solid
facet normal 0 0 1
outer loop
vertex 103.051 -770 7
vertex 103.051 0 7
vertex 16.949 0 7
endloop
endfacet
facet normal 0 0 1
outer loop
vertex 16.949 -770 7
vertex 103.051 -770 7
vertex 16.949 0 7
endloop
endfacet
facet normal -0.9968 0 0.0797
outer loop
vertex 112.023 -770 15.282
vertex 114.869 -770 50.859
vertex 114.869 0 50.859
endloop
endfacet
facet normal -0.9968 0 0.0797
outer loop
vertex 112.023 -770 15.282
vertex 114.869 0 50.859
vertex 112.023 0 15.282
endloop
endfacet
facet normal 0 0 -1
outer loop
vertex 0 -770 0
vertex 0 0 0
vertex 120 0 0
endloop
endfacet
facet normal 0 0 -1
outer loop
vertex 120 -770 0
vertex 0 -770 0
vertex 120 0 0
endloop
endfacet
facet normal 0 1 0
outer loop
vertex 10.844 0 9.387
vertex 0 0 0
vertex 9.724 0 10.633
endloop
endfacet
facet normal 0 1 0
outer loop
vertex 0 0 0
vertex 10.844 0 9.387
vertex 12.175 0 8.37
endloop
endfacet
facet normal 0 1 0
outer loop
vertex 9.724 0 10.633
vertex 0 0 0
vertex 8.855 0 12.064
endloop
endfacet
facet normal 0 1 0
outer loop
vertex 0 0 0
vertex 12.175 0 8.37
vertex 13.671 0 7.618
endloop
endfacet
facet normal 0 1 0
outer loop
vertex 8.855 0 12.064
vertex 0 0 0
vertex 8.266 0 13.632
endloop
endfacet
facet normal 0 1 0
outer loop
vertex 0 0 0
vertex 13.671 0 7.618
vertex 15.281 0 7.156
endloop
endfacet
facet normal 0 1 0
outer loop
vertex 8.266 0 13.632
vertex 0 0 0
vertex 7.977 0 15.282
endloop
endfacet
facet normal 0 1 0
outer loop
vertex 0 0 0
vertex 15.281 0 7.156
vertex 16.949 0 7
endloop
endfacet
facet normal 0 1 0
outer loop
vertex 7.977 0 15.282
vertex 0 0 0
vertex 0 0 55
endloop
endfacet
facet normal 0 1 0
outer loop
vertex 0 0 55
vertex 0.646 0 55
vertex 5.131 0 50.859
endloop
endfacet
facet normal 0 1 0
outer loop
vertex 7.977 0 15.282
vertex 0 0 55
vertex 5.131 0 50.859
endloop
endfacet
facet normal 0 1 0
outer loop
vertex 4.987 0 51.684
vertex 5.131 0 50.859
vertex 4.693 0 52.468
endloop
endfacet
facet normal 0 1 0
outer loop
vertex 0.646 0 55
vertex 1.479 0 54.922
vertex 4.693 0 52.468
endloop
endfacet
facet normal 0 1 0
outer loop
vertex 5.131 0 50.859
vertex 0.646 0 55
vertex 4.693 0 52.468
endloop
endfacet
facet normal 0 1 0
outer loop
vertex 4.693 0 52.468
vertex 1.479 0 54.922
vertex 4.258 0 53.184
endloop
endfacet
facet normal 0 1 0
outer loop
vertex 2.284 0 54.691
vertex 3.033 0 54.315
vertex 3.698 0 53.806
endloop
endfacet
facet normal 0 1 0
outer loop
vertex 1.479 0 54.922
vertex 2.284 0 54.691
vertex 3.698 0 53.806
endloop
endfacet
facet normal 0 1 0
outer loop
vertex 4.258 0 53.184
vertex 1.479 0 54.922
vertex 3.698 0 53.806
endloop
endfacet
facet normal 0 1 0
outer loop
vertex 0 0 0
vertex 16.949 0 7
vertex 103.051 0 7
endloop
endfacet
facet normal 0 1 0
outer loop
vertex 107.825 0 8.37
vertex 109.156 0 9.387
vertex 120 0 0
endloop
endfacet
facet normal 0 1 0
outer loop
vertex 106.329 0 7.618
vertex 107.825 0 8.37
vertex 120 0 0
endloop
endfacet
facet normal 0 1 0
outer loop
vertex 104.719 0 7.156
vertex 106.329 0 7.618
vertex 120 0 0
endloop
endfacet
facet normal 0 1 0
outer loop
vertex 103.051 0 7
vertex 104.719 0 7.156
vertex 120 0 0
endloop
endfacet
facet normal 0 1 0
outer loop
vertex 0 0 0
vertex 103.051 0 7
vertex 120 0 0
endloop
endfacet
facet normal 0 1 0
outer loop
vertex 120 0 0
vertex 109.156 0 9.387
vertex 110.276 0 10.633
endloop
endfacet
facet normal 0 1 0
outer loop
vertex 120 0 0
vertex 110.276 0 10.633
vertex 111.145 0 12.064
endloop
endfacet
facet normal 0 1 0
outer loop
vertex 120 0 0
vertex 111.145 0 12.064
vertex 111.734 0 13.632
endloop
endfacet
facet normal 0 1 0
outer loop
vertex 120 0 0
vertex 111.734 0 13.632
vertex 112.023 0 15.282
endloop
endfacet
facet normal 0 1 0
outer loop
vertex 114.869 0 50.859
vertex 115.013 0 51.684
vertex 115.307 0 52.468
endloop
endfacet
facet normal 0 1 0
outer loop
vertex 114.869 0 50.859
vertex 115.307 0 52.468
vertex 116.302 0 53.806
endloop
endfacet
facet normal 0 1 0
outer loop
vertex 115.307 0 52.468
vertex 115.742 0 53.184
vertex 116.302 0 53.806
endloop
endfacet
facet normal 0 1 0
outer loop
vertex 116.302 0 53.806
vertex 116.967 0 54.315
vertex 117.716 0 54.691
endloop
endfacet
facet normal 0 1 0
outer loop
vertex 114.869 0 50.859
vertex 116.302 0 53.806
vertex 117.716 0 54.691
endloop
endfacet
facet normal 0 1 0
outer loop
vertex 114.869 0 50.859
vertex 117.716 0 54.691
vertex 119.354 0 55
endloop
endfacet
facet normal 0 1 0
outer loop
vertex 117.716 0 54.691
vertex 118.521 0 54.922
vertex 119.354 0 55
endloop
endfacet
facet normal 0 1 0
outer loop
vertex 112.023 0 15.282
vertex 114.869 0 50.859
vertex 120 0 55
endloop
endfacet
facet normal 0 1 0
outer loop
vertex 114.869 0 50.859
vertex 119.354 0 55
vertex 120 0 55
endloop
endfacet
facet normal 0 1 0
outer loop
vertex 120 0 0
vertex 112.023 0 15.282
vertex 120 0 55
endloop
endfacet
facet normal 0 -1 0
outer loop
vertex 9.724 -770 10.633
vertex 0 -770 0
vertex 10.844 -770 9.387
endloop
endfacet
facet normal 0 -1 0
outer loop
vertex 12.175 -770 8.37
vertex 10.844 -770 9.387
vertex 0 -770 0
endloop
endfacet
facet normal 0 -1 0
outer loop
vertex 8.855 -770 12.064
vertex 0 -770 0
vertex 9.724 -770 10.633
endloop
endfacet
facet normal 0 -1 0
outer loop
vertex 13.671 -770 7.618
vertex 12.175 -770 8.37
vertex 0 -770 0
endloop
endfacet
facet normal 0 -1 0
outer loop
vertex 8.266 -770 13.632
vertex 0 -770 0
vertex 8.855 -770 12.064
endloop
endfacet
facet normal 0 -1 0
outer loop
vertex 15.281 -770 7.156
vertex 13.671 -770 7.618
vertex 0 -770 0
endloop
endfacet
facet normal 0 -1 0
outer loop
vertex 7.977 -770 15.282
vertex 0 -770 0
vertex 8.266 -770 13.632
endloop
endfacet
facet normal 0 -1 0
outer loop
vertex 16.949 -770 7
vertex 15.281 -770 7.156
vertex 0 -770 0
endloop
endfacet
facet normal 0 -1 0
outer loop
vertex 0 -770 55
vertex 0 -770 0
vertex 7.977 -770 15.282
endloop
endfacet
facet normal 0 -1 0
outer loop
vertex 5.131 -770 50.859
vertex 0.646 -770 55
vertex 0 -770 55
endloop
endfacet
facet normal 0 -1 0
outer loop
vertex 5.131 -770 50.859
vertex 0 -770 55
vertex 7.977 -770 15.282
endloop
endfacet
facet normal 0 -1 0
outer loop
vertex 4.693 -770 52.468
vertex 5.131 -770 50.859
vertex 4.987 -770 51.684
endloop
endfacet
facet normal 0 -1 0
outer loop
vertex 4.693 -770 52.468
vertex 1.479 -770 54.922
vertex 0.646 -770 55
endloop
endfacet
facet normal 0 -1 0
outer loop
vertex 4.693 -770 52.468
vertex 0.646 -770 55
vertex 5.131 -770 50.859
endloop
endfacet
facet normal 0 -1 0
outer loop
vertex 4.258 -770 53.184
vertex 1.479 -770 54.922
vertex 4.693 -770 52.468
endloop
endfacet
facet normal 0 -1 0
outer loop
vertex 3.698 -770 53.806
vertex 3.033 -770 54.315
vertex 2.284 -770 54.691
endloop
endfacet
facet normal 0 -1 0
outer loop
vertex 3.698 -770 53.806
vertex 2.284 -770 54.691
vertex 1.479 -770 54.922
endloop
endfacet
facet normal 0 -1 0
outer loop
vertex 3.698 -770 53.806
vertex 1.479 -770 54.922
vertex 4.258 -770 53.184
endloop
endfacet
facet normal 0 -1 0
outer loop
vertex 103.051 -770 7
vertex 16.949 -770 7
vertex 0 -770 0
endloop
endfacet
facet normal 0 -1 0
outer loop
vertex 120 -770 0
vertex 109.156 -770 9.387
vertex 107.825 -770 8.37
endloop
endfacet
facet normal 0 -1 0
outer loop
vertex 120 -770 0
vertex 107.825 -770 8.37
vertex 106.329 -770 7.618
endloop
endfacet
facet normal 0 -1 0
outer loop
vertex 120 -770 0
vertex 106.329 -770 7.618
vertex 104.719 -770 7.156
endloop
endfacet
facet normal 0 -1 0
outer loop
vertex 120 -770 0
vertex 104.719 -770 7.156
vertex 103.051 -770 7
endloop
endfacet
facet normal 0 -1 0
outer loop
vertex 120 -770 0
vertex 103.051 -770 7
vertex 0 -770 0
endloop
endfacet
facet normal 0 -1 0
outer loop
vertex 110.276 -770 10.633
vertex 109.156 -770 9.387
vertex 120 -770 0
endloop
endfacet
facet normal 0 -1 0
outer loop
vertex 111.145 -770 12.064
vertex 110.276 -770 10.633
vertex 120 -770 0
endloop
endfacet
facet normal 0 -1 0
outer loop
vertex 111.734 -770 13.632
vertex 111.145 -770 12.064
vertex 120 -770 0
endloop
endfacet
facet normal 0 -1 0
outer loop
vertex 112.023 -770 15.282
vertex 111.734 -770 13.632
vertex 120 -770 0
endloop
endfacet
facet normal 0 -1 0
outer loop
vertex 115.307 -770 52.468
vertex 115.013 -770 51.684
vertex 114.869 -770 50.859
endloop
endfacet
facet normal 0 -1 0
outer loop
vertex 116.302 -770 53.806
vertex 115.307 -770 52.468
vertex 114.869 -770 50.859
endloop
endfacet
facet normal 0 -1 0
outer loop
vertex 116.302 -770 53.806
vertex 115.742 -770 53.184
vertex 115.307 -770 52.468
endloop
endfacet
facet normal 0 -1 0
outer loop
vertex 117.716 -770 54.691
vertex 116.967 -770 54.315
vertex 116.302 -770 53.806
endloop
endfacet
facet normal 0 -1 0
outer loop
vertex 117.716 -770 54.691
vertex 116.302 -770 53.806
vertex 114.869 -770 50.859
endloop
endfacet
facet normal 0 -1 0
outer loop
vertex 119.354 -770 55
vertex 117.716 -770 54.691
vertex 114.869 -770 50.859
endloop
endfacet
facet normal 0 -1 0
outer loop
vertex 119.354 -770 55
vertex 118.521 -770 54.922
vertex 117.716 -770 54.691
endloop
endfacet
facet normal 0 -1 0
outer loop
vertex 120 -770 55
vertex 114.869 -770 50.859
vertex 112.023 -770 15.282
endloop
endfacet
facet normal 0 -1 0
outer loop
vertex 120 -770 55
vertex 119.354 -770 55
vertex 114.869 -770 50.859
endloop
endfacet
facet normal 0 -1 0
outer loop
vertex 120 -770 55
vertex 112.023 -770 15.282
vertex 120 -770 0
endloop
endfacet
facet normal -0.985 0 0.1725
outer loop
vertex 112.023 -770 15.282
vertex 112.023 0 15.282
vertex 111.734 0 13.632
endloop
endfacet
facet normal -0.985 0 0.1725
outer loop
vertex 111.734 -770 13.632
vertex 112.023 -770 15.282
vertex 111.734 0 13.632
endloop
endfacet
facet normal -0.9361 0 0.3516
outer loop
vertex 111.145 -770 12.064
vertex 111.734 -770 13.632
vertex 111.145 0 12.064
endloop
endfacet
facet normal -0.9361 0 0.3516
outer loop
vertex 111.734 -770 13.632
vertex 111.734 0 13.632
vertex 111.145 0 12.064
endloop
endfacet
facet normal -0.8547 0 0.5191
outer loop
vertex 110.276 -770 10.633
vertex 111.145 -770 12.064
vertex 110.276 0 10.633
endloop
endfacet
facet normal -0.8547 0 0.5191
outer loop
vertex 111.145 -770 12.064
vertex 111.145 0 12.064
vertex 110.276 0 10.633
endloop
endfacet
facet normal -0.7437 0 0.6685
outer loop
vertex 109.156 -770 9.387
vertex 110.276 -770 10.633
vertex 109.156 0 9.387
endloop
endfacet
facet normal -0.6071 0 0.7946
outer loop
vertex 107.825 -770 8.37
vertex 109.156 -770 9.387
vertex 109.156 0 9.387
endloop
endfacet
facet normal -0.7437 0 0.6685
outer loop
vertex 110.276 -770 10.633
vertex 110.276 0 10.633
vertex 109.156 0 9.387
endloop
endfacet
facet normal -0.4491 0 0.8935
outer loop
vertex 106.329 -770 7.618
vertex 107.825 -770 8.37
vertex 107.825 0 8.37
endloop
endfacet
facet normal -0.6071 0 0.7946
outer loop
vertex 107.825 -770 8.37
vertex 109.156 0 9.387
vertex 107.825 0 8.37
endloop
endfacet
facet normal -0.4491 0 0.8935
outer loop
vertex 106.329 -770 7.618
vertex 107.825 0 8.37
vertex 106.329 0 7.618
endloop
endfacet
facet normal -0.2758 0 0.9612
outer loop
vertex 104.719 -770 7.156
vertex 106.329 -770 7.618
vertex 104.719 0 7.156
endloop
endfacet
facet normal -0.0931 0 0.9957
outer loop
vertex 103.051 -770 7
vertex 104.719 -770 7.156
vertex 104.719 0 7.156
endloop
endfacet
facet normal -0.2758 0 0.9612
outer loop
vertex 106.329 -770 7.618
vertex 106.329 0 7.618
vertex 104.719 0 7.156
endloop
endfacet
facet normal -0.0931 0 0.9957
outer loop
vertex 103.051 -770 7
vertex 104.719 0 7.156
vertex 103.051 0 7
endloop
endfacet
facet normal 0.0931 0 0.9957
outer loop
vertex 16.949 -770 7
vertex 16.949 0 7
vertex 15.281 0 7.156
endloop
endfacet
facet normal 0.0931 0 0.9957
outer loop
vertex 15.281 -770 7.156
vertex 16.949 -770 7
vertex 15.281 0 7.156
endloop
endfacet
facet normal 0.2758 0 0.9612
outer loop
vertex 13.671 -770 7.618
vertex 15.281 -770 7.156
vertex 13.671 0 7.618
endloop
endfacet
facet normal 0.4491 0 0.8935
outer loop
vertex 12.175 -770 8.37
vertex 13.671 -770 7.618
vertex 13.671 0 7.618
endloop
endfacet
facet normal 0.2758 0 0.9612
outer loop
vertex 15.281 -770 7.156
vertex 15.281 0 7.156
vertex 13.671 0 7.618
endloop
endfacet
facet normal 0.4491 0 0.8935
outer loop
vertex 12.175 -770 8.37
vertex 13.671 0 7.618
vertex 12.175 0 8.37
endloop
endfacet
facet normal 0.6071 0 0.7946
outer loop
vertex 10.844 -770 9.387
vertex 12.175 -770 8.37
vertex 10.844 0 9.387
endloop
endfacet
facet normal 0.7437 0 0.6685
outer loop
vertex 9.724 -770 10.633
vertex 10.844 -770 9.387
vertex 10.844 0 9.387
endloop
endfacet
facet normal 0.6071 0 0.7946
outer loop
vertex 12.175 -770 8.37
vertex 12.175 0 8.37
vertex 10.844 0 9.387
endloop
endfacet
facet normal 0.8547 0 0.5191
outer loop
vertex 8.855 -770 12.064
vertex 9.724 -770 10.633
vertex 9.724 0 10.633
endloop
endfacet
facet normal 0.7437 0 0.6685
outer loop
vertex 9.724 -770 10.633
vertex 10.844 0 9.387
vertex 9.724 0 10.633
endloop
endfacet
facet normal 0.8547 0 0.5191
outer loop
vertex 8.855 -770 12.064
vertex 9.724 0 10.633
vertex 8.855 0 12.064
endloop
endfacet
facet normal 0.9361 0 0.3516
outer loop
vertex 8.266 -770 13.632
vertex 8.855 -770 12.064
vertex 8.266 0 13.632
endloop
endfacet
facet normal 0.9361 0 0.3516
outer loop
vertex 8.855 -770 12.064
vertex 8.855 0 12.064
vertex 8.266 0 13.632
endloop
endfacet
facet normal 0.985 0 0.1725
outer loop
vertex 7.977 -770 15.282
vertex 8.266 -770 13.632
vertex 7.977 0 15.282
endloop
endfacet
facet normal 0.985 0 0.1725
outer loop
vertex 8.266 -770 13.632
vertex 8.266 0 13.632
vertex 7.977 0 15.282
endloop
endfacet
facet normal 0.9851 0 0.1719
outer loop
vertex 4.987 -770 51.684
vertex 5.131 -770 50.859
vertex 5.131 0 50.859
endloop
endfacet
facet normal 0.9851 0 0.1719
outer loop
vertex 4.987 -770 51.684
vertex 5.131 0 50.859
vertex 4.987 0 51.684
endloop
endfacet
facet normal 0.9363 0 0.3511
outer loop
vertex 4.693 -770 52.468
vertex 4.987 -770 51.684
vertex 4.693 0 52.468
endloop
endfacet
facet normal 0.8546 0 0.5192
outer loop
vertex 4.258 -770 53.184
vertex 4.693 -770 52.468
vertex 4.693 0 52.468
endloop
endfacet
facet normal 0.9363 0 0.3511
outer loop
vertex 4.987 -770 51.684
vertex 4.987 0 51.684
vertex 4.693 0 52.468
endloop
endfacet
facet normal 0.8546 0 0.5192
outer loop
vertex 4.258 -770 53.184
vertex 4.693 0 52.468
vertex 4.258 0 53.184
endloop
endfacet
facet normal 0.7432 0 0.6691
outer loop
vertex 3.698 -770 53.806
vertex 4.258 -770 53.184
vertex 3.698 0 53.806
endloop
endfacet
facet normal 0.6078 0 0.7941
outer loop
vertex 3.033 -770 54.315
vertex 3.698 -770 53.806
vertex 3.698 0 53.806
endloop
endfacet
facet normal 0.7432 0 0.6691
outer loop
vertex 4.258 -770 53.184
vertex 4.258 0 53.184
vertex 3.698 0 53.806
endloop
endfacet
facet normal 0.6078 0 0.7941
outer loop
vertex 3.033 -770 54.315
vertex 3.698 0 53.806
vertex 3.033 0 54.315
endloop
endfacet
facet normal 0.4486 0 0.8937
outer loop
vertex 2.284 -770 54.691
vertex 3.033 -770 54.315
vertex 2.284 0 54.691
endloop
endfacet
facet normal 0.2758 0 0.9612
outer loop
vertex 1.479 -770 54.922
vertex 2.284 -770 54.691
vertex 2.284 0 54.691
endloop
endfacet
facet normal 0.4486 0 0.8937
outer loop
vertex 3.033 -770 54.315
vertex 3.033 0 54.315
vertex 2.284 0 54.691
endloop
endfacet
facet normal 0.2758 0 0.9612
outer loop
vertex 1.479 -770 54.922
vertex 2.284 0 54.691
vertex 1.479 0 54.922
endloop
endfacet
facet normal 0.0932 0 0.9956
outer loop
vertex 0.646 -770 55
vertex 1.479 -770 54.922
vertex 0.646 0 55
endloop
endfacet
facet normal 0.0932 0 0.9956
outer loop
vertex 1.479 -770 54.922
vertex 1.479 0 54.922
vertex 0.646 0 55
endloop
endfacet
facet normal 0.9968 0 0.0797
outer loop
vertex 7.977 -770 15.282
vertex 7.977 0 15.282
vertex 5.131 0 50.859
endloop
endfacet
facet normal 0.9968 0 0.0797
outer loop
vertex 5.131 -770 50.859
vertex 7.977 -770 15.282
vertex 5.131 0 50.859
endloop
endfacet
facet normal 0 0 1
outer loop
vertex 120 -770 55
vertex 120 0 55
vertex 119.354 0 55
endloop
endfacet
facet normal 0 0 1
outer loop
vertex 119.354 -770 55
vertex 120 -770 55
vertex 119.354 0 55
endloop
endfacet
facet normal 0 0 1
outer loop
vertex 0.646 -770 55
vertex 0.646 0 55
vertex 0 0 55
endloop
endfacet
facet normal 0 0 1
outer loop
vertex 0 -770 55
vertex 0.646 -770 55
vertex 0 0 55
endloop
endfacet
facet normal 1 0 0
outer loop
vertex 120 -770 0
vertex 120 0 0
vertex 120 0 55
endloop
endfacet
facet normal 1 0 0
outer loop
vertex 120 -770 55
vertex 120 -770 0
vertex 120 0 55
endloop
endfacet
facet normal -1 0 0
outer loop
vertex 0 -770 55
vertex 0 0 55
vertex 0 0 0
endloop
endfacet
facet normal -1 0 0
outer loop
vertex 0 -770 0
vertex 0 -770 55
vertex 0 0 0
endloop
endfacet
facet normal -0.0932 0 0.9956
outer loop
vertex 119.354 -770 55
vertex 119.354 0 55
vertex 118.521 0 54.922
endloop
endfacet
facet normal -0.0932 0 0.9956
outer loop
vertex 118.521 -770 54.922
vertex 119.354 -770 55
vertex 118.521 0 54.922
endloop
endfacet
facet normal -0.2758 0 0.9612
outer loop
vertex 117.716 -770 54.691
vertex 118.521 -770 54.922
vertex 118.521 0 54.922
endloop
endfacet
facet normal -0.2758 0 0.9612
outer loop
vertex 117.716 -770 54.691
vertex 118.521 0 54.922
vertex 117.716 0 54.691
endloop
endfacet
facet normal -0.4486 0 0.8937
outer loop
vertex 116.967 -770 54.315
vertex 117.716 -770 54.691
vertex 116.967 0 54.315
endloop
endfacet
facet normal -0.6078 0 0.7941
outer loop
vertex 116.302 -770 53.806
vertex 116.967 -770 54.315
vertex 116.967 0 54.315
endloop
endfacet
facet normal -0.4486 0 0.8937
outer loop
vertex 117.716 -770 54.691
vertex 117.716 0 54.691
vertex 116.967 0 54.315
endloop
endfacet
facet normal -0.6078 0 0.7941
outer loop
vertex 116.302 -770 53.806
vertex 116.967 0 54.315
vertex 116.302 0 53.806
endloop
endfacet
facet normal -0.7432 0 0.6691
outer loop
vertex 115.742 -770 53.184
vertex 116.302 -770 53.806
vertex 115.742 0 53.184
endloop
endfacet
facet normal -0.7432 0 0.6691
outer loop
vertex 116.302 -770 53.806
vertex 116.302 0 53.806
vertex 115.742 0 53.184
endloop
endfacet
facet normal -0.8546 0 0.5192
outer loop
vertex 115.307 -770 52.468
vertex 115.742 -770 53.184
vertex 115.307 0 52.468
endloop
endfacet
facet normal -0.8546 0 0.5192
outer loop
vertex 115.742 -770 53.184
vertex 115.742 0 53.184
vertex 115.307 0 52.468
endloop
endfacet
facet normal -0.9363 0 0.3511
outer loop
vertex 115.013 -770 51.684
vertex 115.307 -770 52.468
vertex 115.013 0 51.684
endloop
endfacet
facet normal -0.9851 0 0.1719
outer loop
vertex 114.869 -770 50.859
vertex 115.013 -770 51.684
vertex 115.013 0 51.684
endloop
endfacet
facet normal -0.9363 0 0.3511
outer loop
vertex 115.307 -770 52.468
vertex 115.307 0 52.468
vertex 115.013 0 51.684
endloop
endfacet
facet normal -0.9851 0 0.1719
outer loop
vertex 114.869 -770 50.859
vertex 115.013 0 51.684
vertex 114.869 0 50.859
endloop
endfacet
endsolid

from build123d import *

# Parameters (mm, degrees)
F1_DEPTH = 770


with BuildPart() as f1:
    # F0 (on Front) → F1 (new body)
    with BuildSketch(Plane.XZ):
        with BuildLine():
            Line((0.645623, 55), (0, 55))
            Line((0, 55), (0, 0))
            Line((0, 0), (120, 0))
            Line((120, 0), (120, 55))
            Line((120, 55), (119.354377, 55))
            ThreePointArc((119.354377, 55), (116.301906, 53.806421), (114.868708, 50.858854))
            Line((114.868708, 50.858854), (112.022583, 15.282293))
            ThreePointArc((112.022583, 15.282293), (109.156188, 9.387158), (103.051246, 7))
            Line((103.051246, 7), (16.948754, 7))
            ThreePointArc((16.948754, 7), (10.843812, 9.387158), (7.977417, 15.282293))
            Line((7.977417, 15.282293), (5.131292, 50.858854))
            ThreePointArc((5.131292, 50.858854), (3.698094, 53.806421), (0.645623, 55))
        make_face()
    extrude(amount=F1_DEPTH)


solid = f1.part
